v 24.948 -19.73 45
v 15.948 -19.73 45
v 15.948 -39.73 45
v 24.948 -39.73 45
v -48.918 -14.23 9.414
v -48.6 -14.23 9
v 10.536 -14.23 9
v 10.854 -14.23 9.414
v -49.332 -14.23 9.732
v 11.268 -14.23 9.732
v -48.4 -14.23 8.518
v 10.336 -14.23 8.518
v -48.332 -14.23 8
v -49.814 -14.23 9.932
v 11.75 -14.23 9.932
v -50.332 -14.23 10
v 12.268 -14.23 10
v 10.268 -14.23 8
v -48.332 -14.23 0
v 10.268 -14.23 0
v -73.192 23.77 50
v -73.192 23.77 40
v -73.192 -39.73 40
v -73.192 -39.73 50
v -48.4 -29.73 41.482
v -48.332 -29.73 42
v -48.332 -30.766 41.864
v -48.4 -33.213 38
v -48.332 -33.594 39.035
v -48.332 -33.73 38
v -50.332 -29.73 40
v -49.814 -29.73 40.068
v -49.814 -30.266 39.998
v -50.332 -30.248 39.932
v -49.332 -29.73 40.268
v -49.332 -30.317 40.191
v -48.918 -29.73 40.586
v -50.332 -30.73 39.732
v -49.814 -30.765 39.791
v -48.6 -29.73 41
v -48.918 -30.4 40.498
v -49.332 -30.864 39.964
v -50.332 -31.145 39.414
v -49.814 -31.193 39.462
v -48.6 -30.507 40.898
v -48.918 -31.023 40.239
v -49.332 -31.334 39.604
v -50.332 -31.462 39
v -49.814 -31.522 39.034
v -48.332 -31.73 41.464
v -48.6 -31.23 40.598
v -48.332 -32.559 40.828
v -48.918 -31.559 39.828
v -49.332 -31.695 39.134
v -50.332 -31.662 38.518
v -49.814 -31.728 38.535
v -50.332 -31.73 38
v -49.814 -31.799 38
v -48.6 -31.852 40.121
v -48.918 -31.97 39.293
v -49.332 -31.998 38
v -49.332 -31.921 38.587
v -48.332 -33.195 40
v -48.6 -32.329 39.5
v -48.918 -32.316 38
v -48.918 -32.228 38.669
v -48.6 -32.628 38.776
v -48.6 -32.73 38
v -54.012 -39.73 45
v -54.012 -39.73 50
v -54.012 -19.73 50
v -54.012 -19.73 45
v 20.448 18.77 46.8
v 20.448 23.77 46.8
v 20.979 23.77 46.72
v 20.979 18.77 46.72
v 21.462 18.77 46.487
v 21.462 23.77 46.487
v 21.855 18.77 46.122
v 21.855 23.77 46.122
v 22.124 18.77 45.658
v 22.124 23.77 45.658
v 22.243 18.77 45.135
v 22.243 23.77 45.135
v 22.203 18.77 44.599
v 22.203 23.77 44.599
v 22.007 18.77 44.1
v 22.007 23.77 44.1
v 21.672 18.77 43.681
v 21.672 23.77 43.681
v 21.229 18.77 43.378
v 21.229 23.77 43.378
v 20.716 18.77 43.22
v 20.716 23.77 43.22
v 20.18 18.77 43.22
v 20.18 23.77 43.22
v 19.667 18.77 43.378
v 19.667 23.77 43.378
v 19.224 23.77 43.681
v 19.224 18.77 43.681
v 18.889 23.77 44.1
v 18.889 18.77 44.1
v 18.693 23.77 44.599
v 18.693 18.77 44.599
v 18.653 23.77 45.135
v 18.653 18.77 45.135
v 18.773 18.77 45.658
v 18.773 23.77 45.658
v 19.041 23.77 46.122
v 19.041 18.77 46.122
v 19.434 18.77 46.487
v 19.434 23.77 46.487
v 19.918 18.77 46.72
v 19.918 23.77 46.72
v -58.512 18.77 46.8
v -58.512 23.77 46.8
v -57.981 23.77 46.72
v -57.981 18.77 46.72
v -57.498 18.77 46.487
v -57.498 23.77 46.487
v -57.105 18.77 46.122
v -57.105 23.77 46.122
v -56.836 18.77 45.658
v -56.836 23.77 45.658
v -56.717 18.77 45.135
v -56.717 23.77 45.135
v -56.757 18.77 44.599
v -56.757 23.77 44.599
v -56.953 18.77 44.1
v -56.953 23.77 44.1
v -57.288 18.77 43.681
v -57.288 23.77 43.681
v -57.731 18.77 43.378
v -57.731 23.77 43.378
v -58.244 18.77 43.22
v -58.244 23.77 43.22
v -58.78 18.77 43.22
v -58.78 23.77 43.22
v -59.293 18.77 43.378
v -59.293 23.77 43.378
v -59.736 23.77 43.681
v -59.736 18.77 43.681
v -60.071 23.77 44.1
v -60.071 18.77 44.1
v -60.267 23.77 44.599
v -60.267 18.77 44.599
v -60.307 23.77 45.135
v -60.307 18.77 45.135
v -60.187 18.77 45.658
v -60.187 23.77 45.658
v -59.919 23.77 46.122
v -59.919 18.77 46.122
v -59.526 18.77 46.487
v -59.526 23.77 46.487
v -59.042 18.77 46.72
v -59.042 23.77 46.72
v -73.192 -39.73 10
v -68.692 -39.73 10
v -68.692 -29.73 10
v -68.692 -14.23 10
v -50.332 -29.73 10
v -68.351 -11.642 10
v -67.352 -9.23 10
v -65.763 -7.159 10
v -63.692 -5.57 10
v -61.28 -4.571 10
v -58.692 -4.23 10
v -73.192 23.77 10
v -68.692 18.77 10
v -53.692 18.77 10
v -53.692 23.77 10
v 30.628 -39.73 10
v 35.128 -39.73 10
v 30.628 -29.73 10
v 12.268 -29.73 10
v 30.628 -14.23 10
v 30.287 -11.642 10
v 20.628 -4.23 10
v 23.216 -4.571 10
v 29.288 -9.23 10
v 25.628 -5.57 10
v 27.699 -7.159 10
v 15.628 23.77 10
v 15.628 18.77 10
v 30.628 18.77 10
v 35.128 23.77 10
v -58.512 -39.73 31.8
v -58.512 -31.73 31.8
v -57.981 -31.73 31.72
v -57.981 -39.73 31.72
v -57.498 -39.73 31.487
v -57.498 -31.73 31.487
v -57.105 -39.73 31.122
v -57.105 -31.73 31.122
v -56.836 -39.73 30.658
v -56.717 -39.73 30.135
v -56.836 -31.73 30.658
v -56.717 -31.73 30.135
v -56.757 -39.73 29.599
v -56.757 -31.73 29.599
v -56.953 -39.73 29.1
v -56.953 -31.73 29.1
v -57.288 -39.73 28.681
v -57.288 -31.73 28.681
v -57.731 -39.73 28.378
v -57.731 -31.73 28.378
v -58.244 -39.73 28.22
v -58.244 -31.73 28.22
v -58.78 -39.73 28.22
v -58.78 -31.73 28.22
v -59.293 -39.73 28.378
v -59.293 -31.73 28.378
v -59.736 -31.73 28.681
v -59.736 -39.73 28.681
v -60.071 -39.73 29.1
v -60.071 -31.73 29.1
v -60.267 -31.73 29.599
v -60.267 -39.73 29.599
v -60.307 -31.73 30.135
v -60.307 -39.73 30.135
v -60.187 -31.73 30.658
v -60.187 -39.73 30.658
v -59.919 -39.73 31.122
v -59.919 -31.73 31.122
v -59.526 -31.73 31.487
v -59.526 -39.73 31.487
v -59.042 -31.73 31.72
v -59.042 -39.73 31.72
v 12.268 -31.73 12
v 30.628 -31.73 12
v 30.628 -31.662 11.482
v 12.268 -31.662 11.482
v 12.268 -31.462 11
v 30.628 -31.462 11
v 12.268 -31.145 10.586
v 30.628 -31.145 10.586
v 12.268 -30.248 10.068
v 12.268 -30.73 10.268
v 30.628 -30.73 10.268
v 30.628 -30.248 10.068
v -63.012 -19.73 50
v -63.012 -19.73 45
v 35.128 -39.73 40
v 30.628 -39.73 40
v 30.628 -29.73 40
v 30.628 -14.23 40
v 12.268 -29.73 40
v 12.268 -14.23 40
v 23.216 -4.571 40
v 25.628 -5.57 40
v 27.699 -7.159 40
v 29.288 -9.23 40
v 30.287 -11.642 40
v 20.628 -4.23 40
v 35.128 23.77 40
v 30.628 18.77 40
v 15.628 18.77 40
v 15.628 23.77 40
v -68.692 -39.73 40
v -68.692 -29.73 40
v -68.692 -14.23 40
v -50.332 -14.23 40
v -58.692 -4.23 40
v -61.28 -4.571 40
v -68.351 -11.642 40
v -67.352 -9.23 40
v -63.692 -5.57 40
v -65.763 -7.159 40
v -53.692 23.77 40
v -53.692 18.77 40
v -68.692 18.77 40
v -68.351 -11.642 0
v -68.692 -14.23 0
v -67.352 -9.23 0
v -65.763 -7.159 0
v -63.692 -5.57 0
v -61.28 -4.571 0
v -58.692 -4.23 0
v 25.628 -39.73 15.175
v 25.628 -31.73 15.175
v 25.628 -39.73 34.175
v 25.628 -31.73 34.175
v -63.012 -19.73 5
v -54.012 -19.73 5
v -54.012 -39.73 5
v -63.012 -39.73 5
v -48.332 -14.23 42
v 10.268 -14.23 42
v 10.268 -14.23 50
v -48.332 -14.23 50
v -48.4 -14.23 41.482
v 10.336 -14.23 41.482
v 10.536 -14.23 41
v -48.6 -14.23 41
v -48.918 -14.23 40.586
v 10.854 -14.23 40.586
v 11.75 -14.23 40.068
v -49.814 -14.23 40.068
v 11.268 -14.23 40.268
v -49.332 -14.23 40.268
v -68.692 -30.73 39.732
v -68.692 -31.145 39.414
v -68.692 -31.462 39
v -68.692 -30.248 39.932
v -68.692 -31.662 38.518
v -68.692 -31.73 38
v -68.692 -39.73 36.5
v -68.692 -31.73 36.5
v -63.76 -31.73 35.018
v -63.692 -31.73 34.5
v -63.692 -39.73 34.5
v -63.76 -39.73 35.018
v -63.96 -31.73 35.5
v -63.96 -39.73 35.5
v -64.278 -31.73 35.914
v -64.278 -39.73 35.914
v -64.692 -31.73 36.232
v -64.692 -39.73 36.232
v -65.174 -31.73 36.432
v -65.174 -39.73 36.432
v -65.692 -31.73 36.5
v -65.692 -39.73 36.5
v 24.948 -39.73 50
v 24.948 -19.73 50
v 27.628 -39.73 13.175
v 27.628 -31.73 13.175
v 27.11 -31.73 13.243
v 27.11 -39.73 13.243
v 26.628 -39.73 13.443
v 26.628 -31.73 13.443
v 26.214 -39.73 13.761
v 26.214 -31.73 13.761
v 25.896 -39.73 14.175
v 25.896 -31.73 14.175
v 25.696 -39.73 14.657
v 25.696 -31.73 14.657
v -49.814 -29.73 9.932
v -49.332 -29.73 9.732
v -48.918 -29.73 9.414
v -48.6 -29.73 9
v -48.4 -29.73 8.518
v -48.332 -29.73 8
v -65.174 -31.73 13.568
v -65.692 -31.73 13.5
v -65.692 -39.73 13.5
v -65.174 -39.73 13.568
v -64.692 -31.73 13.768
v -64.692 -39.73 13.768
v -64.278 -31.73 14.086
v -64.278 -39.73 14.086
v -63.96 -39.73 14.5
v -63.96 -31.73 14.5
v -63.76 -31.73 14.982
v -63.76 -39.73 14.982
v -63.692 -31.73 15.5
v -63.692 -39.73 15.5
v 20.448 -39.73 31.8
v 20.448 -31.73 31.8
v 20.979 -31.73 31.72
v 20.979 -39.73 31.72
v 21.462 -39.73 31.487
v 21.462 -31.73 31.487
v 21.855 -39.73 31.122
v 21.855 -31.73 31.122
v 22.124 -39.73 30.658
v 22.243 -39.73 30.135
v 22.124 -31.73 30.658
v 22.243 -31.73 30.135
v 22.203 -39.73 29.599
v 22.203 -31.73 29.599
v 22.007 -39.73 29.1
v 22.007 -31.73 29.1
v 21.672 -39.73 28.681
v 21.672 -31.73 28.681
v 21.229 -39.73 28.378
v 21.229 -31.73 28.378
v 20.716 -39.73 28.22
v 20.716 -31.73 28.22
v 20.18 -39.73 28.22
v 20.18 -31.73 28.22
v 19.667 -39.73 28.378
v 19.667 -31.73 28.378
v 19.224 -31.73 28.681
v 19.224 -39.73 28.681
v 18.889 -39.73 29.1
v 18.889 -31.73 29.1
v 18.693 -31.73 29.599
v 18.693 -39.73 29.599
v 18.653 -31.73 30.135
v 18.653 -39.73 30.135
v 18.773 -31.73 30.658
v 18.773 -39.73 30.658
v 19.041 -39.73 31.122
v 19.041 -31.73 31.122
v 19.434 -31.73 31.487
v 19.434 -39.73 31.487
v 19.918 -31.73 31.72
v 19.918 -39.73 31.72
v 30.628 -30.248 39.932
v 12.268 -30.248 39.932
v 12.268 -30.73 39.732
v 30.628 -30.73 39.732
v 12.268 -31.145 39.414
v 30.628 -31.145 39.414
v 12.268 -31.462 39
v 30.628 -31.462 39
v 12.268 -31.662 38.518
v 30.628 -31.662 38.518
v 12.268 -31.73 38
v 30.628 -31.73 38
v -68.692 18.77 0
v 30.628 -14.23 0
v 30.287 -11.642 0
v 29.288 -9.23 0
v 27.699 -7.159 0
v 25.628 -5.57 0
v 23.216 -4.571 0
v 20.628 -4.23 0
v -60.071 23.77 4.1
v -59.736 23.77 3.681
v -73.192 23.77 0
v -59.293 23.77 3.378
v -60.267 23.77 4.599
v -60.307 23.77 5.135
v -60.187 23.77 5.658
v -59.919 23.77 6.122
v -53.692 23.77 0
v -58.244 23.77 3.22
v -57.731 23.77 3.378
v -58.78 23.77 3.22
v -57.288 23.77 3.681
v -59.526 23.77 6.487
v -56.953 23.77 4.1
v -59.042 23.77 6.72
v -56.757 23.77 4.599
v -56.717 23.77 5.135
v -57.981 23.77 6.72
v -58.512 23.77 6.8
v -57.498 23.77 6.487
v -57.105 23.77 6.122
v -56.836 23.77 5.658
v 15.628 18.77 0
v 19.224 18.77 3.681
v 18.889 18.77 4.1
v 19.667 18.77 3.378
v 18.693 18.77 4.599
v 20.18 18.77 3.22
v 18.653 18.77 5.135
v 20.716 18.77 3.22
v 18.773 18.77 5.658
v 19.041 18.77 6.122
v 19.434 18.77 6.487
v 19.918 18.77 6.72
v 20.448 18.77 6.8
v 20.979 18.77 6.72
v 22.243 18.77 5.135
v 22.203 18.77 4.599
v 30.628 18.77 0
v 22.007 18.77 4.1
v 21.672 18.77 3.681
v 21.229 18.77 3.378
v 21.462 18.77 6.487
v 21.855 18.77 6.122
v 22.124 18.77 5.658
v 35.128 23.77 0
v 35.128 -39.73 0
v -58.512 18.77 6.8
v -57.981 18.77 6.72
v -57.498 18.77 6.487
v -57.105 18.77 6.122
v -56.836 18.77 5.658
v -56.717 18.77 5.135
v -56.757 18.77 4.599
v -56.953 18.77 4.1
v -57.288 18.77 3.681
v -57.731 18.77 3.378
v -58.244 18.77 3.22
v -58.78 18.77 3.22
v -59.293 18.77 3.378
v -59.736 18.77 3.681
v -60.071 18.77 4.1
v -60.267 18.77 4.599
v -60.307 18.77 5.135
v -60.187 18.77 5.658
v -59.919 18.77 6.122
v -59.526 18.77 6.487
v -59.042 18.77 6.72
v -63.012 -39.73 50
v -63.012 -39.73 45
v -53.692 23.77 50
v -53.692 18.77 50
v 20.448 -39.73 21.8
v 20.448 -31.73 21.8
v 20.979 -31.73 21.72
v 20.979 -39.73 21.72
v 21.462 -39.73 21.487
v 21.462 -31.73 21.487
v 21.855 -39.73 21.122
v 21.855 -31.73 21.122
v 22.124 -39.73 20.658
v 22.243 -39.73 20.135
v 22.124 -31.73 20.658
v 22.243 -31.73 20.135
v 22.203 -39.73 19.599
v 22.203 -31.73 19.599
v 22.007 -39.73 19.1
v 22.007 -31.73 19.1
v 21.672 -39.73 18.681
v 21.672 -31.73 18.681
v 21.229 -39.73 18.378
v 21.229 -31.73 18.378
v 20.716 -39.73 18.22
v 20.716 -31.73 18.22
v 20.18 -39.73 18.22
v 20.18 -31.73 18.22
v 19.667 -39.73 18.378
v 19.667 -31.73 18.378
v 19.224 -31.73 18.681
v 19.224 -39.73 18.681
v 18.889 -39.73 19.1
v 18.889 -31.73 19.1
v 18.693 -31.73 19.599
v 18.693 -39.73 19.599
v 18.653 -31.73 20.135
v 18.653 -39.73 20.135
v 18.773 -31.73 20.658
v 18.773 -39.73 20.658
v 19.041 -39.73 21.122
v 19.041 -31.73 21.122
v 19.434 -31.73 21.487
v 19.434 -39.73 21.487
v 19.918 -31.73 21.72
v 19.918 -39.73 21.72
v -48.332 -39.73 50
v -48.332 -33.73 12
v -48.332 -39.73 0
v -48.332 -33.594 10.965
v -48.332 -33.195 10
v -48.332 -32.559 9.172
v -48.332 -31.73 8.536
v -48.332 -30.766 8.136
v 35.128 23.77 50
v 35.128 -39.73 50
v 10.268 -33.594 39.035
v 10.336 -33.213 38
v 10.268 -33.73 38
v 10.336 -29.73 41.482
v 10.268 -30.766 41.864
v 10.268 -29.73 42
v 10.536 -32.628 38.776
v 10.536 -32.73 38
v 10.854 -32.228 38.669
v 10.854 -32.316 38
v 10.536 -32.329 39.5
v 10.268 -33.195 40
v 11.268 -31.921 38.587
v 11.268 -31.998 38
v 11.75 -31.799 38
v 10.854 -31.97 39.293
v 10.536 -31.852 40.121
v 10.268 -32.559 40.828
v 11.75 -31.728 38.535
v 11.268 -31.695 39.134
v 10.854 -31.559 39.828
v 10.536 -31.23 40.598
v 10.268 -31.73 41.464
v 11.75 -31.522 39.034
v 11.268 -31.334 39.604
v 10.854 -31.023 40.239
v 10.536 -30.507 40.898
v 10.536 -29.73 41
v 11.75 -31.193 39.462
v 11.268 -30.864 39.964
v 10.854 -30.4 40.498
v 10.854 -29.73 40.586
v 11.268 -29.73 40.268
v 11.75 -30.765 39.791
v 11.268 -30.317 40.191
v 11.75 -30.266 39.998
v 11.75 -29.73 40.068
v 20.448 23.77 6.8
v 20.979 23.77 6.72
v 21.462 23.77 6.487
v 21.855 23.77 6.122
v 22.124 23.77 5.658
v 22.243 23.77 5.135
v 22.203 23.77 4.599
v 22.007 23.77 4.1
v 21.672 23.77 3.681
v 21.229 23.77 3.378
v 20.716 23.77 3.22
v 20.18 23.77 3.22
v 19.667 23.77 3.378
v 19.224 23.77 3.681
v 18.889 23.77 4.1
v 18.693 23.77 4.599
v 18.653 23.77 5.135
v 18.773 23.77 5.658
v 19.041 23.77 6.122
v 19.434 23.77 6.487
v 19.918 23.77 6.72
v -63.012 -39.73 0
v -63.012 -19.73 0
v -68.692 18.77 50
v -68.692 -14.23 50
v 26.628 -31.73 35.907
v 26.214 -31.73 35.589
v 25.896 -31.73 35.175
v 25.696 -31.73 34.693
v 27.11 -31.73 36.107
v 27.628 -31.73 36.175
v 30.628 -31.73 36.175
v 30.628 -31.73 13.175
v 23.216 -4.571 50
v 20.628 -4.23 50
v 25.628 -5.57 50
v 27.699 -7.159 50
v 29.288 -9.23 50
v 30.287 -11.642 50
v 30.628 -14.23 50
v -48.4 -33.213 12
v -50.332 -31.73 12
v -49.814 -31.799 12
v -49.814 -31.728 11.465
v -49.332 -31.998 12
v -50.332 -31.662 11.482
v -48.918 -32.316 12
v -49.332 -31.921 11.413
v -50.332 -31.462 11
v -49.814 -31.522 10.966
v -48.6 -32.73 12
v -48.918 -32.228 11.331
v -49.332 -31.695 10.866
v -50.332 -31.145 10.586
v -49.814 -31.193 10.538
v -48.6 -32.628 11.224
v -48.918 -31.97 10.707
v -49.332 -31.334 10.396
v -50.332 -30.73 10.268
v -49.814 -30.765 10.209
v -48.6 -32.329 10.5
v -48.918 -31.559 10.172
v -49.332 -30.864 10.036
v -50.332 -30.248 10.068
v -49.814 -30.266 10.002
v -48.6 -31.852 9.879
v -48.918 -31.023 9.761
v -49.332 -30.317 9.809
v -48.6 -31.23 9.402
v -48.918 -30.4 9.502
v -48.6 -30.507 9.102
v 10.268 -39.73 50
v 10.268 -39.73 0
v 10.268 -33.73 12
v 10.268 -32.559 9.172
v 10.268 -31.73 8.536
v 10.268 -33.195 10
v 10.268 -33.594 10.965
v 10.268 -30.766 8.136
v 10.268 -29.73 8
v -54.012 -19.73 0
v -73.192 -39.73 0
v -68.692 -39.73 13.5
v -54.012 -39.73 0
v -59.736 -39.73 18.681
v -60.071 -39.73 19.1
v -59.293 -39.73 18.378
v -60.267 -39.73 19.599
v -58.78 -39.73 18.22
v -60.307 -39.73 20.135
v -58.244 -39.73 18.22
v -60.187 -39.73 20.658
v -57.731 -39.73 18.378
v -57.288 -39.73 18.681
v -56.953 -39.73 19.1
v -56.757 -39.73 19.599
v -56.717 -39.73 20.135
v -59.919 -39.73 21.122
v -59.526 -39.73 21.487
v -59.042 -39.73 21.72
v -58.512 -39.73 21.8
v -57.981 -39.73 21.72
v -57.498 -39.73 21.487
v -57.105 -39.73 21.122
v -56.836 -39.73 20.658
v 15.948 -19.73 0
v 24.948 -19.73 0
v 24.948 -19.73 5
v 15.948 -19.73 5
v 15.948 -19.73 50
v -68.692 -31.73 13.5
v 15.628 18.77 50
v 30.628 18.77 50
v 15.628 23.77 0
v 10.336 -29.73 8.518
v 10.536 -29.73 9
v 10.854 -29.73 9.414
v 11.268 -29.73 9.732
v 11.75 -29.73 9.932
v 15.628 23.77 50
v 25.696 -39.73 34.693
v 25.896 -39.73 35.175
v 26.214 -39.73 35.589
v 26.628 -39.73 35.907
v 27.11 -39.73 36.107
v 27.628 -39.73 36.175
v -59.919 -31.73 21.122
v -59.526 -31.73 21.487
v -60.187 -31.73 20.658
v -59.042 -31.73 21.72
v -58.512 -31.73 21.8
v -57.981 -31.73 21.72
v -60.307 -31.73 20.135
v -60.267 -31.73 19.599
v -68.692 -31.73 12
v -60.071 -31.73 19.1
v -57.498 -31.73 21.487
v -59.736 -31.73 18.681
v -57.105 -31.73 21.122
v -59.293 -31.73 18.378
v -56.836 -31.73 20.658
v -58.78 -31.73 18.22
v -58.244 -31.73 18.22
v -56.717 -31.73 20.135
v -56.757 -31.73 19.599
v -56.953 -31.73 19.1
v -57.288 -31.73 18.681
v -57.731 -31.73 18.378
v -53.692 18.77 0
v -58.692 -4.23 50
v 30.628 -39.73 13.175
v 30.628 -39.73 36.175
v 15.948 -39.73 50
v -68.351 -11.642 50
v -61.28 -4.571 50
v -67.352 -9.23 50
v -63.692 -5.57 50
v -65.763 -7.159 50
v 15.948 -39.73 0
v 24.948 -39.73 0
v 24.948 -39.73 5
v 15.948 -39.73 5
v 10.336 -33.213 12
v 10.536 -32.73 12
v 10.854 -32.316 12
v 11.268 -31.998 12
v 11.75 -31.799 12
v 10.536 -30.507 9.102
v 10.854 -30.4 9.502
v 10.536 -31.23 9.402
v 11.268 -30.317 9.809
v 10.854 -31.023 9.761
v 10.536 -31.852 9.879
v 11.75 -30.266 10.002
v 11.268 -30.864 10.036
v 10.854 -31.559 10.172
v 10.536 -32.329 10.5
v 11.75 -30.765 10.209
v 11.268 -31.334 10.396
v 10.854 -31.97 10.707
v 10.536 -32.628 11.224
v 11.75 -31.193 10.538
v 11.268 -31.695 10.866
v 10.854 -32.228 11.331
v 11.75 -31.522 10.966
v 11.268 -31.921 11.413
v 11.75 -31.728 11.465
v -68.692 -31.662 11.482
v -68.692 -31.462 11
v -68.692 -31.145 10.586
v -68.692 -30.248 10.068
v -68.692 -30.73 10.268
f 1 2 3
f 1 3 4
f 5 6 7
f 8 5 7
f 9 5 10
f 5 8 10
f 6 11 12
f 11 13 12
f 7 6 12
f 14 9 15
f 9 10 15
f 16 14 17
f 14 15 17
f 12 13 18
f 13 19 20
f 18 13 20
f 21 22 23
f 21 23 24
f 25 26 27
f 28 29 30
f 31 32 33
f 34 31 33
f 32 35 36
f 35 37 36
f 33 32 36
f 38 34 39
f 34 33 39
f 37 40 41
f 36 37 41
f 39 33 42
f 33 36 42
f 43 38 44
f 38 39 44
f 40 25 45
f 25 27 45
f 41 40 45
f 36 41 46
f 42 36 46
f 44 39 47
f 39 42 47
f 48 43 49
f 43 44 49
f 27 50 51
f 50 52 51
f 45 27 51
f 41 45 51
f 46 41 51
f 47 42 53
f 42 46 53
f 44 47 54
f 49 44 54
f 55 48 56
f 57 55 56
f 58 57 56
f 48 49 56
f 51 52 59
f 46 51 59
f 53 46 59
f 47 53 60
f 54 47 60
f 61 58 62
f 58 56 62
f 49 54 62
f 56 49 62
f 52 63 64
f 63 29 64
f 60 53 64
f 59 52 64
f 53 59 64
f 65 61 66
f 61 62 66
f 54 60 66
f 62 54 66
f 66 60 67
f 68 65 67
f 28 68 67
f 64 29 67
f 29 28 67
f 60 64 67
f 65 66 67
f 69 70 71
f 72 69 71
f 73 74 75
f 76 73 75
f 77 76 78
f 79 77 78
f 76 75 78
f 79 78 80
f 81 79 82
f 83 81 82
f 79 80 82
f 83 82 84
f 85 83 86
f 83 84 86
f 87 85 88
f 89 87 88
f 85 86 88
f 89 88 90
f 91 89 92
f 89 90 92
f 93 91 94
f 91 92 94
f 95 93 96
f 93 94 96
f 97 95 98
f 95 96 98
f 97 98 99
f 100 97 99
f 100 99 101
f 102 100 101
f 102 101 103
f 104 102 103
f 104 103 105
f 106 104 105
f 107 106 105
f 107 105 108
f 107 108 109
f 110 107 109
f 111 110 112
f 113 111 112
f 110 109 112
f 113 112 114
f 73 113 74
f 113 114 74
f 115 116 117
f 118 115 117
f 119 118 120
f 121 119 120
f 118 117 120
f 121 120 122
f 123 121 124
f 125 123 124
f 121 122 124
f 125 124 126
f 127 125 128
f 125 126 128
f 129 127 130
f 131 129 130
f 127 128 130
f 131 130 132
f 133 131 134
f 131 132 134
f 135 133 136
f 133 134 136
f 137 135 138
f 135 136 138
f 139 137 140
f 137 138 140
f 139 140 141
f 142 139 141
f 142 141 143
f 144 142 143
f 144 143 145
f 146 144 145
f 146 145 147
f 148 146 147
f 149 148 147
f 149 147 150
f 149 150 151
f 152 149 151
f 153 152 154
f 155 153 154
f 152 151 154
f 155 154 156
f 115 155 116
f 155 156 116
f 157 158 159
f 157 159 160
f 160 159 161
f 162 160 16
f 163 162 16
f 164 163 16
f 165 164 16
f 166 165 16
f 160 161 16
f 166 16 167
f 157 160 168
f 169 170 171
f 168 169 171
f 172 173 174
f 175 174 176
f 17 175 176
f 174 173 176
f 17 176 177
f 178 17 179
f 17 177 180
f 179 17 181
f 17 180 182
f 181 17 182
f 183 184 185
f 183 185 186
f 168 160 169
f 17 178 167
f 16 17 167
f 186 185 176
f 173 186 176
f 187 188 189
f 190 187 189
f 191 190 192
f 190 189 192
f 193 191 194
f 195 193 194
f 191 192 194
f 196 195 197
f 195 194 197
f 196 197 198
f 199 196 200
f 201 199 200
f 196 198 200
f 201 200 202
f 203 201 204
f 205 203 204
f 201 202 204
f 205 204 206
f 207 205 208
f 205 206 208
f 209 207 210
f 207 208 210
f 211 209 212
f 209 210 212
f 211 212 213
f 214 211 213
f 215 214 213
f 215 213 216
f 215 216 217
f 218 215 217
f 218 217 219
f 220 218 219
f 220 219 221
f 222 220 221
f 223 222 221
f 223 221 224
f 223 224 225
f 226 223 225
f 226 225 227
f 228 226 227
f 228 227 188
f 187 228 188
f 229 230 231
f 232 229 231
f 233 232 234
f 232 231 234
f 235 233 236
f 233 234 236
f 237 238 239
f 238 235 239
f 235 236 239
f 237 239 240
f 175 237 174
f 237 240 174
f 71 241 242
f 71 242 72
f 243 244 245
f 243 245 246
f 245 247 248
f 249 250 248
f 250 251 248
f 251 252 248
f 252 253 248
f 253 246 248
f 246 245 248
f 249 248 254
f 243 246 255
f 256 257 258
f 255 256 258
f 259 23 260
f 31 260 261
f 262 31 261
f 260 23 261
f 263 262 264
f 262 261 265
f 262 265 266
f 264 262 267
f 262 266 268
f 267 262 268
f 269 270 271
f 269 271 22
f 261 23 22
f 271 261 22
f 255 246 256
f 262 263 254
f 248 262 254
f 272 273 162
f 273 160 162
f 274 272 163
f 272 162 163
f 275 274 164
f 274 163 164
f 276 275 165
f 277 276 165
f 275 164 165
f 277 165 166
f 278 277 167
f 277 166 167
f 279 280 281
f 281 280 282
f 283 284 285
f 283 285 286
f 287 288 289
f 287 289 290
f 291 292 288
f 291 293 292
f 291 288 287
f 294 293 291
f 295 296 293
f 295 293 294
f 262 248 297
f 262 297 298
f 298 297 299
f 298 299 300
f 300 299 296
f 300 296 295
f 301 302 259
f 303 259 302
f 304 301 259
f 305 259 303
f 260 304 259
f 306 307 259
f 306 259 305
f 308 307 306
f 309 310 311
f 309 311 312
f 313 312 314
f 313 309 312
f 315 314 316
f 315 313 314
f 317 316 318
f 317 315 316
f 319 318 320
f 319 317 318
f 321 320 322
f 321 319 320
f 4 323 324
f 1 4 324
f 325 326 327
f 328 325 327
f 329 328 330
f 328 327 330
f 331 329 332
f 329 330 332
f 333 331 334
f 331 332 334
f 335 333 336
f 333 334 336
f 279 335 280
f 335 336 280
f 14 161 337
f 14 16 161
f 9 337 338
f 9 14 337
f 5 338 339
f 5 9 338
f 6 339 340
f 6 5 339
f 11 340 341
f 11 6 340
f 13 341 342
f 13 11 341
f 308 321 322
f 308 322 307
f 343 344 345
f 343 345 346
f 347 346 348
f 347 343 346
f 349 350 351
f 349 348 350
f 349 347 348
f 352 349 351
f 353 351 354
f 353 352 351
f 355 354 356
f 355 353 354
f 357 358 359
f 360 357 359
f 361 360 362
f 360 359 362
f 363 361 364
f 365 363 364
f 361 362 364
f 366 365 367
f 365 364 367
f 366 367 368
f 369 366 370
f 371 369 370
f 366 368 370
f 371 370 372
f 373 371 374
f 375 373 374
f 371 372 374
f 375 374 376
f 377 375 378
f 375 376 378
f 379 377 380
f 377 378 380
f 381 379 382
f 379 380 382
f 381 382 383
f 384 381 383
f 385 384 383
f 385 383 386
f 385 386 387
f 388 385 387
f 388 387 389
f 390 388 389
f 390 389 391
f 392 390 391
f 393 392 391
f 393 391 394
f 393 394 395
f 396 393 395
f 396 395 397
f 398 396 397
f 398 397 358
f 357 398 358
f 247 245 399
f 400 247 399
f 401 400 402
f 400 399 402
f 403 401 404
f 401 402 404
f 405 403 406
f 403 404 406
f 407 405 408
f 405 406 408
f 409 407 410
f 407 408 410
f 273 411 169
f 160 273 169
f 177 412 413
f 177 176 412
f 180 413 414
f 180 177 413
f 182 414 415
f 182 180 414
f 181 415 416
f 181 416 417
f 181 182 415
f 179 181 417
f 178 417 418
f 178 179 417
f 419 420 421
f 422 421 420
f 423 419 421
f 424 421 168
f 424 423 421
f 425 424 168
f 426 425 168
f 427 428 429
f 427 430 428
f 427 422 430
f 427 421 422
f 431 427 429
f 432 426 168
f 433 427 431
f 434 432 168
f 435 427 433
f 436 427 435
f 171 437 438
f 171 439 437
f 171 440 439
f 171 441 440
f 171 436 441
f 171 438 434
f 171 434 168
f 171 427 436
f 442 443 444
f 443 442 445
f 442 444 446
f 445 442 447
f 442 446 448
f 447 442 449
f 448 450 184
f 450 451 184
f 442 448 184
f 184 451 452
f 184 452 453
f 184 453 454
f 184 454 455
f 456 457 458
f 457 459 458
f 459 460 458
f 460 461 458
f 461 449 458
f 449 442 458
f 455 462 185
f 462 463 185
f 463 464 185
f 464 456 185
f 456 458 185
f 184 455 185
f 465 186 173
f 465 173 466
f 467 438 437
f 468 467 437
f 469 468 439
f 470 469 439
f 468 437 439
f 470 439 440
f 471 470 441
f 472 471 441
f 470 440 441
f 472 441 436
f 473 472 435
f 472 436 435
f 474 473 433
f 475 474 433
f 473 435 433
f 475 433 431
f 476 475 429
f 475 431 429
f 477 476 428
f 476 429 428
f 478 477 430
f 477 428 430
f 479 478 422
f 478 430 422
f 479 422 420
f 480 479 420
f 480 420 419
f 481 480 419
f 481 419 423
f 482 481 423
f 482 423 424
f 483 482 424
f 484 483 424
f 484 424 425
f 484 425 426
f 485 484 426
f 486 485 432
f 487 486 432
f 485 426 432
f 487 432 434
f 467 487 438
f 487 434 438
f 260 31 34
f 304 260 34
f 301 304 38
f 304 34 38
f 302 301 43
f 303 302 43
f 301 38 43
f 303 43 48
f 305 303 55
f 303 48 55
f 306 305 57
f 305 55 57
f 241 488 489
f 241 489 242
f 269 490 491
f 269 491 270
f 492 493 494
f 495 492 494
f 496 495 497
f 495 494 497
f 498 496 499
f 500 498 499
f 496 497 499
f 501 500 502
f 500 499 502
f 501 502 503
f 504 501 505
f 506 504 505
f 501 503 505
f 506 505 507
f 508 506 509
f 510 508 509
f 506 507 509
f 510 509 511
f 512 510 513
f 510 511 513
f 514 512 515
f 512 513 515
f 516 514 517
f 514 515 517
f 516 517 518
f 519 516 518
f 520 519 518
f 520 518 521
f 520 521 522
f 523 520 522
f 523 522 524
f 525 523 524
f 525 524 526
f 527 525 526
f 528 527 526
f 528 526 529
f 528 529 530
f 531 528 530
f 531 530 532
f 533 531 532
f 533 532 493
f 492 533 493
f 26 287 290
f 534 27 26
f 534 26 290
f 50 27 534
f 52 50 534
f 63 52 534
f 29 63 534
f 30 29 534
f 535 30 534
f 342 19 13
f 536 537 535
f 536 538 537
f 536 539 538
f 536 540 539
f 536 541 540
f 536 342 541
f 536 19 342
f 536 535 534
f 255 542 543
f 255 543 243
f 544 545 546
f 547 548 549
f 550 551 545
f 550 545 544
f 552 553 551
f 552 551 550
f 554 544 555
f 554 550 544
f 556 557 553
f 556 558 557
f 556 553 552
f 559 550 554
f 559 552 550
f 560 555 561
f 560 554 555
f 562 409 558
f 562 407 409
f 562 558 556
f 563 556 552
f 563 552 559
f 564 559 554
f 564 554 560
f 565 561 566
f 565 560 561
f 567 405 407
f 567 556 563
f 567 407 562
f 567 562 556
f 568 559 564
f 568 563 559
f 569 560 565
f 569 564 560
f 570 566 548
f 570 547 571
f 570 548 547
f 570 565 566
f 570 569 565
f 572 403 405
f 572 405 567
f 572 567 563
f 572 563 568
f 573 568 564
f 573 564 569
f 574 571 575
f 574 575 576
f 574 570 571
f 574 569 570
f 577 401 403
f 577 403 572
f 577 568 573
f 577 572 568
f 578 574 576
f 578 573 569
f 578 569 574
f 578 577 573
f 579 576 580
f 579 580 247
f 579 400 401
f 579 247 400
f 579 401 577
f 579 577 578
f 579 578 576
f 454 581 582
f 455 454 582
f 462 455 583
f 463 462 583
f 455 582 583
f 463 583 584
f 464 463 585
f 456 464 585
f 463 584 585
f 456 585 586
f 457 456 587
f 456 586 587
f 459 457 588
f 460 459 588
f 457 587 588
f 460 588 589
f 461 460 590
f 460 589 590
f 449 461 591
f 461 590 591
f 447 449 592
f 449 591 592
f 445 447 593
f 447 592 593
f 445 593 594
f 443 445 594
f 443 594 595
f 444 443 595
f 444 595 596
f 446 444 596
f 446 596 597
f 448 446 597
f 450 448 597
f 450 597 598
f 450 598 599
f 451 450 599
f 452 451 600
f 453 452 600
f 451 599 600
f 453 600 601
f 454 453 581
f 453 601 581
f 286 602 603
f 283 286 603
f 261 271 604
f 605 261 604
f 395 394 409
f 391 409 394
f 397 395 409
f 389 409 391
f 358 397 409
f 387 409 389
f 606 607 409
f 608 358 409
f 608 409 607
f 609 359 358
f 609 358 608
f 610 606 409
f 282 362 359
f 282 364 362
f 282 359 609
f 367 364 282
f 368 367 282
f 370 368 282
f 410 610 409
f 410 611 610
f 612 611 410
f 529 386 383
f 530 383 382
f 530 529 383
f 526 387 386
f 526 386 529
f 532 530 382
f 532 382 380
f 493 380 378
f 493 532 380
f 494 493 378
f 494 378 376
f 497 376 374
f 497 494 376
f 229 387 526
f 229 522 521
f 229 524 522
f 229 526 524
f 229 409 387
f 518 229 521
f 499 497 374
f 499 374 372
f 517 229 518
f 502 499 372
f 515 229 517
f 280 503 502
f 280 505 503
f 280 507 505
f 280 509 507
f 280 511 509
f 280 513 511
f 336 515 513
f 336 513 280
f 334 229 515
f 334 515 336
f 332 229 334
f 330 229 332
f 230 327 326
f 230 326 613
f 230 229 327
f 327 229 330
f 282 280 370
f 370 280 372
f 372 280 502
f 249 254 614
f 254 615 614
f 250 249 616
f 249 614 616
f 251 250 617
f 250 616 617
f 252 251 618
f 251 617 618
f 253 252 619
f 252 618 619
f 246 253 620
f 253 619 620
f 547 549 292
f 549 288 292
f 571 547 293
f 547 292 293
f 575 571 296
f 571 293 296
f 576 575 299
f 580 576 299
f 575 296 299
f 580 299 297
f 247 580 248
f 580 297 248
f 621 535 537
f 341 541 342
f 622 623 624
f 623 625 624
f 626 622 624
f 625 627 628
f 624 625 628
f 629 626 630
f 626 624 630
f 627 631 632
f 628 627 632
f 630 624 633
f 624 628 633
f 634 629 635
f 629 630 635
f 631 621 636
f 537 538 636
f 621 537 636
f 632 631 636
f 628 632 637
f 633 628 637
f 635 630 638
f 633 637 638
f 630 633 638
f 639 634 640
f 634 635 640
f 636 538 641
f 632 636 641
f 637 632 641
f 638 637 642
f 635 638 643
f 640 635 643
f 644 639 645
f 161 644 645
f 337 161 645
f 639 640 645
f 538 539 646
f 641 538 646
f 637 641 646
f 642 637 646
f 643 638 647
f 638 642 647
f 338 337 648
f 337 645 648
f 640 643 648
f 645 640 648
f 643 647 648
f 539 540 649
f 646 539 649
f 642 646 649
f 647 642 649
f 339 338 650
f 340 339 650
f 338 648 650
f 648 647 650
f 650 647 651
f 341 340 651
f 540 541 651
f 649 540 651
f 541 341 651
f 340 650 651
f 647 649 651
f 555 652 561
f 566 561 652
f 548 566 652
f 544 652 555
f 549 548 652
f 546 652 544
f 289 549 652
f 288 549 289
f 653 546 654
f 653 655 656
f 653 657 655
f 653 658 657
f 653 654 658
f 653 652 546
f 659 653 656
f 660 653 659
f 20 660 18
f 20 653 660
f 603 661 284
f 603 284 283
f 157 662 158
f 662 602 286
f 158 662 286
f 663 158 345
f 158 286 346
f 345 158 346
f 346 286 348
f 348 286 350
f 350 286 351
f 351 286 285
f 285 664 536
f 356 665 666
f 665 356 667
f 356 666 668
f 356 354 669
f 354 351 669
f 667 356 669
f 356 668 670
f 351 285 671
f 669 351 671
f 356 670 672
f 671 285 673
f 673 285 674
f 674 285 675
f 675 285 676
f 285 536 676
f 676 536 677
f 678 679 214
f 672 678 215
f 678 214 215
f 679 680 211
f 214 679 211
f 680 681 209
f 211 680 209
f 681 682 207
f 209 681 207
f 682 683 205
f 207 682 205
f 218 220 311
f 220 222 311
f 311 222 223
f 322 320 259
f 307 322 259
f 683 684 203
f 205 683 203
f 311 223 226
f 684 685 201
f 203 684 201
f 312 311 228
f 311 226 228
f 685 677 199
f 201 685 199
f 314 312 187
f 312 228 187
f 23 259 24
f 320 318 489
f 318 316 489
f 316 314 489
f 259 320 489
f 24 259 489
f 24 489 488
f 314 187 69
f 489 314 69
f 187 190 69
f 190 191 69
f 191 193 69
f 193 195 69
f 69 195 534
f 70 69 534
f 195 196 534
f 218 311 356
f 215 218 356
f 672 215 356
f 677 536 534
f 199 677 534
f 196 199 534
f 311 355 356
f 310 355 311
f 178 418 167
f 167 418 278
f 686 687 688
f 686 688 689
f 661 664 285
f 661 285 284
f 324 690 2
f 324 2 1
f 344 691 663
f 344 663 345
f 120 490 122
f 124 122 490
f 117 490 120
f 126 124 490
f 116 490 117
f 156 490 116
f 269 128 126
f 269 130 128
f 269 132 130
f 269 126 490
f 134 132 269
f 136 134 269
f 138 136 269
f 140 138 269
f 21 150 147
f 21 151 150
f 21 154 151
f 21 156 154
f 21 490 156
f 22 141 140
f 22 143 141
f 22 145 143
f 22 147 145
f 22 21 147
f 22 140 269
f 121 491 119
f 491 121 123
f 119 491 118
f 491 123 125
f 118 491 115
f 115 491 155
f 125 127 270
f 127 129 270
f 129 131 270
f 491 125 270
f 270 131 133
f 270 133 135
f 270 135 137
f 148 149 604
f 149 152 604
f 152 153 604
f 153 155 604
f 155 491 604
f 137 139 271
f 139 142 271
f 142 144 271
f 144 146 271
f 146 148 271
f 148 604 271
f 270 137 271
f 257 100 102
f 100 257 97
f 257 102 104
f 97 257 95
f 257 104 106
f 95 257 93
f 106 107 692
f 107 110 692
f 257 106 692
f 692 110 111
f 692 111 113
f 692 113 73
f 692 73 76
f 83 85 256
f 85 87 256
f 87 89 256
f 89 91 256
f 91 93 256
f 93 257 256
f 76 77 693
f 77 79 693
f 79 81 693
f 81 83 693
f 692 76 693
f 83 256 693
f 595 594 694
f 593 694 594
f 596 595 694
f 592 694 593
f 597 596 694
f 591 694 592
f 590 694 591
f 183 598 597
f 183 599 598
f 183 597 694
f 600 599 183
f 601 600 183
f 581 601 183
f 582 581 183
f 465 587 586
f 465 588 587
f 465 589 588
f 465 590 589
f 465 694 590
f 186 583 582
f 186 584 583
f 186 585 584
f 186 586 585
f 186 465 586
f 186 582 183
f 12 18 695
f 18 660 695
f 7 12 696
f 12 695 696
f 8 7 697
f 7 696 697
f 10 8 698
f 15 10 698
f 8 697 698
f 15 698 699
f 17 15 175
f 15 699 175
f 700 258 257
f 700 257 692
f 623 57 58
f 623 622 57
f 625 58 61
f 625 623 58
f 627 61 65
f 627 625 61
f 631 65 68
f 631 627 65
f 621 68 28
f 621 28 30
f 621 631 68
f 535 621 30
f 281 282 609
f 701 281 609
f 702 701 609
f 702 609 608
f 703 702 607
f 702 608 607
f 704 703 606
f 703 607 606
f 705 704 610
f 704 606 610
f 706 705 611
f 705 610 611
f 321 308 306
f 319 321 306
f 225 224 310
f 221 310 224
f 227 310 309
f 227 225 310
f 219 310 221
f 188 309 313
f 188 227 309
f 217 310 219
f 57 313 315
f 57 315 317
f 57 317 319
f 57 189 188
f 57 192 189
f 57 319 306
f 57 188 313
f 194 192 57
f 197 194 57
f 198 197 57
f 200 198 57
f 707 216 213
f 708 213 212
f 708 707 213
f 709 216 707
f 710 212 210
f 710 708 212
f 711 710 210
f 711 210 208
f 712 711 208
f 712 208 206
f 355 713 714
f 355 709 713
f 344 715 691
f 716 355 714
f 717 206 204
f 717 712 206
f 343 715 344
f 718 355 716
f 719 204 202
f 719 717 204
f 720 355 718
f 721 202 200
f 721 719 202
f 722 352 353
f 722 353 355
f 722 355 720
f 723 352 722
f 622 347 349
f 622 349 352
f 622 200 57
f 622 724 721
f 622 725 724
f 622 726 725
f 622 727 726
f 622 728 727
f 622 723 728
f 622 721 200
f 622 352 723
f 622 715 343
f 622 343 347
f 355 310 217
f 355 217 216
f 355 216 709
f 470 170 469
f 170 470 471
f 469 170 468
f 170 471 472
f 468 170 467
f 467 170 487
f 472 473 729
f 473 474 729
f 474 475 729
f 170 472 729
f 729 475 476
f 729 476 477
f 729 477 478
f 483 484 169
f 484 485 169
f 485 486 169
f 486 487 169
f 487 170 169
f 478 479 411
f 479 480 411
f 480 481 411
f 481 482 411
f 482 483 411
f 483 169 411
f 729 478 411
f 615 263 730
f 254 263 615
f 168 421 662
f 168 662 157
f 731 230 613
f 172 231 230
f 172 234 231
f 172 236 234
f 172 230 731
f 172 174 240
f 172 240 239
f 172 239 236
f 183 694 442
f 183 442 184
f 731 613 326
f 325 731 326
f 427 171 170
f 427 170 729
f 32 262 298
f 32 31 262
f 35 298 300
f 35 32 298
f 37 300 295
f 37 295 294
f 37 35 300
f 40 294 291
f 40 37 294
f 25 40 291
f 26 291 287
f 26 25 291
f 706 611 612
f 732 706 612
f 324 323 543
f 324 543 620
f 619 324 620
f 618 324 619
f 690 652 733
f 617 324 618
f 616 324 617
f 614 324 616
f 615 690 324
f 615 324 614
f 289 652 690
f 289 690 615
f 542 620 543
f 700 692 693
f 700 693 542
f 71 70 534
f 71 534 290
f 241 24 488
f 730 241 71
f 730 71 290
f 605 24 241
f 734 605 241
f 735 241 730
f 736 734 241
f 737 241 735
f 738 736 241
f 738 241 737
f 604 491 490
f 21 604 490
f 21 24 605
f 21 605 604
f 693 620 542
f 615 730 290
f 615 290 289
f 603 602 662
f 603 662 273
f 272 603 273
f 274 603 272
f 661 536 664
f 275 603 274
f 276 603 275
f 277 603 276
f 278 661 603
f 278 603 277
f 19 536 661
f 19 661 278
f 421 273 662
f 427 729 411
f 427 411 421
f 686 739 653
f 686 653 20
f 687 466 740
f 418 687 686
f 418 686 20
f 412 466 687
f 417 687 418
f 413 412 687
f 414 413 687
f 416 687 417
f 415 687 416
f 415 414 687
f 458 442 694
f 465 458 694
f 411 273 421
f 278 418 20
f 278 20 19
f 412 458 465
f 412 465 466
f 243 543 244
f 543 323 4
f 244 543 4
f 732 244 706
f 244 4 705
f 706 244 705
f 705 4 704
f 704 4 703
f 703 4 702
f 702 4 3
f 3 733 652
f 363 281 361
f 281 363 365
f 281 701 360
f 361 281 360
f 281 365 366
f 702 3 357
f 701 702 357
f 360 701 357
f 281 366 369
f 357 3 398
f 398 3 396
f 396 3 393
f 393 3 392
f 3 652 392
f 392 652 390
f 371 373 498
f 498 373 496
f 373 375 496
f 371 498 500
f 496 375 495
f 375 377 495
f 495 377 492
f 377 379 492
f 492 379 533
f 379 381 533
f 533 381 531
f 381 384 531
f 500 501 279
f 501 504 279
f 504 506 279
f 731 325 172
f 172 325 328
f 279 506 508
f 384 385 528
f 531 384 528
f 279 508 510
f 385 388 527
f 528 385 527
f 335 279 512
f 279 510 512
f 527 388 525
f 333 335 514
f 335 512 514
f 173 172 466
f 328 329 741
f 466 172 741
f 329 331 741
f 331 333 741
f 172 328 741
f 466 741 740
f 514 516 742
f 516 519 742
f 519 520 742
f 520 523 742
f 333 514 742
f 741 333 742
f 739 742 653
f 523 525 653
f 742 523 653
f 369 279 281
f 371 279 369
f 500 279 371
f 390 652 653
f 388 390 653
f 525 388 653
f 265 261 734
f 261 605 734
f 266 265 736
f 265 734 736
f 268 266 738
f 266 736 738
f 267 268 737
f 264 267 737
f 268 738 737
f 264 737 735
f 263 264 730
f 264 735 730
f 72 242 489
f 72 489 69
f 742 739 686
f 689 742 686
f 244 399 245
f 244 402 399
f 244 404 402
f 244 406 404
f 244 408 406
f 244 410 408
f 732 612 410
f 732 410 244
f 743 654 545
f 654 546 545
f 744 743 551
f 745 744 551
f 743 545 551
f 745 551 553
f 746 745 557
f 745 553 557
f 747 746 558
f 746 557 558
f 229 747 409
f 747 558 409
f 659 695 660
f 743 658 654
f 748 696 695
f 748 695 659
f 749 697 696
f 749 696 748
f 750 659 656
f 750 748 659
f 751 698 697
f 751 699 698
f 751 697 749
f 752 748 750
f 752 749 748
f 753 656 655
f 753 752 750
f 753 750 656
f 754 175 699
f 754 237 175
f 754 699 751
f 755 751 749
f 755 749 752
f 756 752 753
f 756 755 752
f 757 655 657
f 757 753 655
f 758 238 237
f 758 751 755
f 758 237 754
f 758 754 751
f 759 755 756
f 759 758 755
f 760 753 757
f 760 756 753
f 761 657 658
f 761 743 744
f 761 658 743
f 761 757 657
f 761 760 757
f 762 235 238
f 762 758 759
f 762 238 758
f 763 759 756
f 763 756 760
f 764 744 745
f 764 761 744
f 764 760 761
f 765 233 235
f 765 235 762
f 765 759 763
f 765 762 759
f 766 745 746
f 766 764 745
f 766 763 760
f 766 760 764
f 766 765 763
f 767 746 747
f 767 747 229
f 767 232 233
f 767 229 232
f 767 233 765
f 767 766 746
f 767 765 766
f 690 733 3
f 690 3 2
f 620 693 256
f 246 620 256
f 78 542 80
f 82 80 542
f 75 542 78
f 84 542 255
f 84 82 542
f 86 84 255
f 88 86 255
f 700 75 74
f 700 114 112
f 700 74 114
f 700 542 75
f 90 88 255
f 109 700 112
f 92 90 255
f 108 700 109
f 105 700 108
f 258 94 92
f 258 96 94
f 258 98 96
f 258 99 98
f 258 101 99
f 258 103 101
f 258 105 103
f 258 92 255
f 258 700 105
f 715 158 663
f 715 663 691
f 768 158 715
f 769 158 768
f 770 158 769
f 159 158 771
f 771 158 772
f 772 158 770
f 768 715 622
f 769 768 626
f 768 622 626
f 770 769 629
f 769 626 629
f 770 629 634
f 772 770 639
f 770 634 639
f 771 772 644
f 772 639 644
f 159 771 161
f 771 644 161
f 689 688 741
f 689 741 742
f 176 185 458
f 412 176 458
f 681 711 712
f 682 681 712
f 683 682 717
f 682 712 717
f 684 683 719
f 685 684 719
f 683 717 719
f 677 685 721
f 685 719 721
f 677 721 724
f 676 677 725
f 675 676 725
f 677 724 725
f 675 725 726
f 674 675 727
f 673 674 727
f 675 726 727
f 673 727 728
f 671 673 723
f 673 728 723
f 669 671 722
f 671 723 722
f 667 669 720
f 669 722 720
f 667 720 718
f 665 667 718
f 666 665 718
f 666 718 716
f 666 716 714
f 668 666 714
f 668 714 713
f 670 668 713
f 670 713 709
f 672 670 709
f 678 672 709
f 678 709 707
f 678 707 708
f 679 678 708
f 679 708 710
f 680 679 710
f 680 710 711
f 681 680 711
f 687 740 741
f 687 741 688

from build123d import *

# Parameters (mm, degrees)
BOSS_EXTRUDE1_DEPTH = 10
SKETCH2_W           = 20.36
SKETCH2_H           = 8
BOSS_EXTRUDE2_DEPTH = 30
BOSS_EXTRUDE3_DEPTH = 10
SKETCH4_R           = 1.8
CUT_EXTRUDE1_DEPTH  = 90.301874976
CUT_EXTRUDE2_DEPTH  = 90.301874976
FILLET2_R           = 10
FILLET3_R           = 2
FILLET4_R           = 2
SKETCH6_W           = 9
SKETCH6_H           = 20
CUT_EXTRUDE3_DEPTH  = 5
SKETCH7_W           = 9
SKETCH7_H           = 20
CUT_EXTRUDE4_DEPTH  = 5
SKETCH8_W           = 10
SKETCH8_H           = 63.5
BOSS_EXTRUDE4_DEPTH = 4.5
SKETCH9_W           = 10
SKETCH9_H           = 5
BOSS_EXTRUDE5_DEPTH = 15
SKETCH10_W          = 10
SKETCH10_H          = 63.5
BOSS_EXTRUDE6_DEPTH = 4.5
SKETCH11_W          = 10
SKETCH11_H          = 5
BOSS_EXTRUDE7_DEPTH = 15
SKETCH12_R          = 1.8
CUT_EXTRUDE5_DEPTH  = 5


with BuildPart() as part:
    # Sketch1 → Boss-Extrude1 (new body)
    with BuildSketch(Plane.XY):
        Polygon((-68.691883613, -39.730446699), (-48.331883613, -39.730446699), (-48.331883613, -14.230446699), (10.268116387, -14.230446699), (10.268116387, -39.730446699), (30.628116387, -39.730446699), (30.628116387, -4.230446699), (-68.691883613, -4.230446699), align=None)
    extrude(amount=BOSS_EXTRUDE1_DEPTH)

    # Sketch2 → Boss-Extrude2 (add)
    with BuildSketch(Plane.XY.offset(10)):
        with Locations((-58.511883613, -35.730446699)):
            Rectangle(SKETCH2_W, SKETCH2_H)
        with Locations((20.448116387, -35.730446699)):
            Rectangle(SKETCH2_W, SKETCH2_H)
    extrude(amount=BOSS_EXTRUDE2_DEPTH)

    # Sketch3 → Boss-Extrude3 (add)
    with BuildSketch(Plane.XY.offset(40)):
        Polygon((-68.691883613, -39.730446699), (-68.691883613, -4.230446699), (30.628116387, -4.230446699), (30.628116387, -39.730446699), (10.268116387, -39.730446699), (10.268116387, -14.230446699), (-48.331883613, -14.230446699), (-48.331883613, -39.730446699), align=None)
    extrude(amount=BOSS_EXTRUDE3_DEPTH)

    # Sketch4 → Cut-Extrude1 (cut, through all)
    with BuildSketch(Plane(origin=(0, -31.730446699, 0), x_dir=(1, 0, 0), z_dir=(0, 1, 0))):
        with Locations(Location((-58.511883613, -20, 0), (0, 0, 270))):
            Circle(SKETCH4_R)
        with Locations(Location((-58.511883613, -30, 0), (0, 0, 270))):
            Circle(SKETCH4_R)
        with Locations(Location((20.448116387, -30, 0), (0, 0, 270))):
            Circle(SKETCH4_R)
        with Locations(Location((20.448116387, -20, 0), (0, 0, 270))):
            Circle(SKETCH4_R)
    extrude(amount=-CUT_EXTRUDE1_DEPTH, mode=Mode.SUBTRACT)

    # Sketch5 → Cut-Extrude2 (cut, through all)
    with BuildSketch(Plane(origin=(0, -31.730446699, 0), x_dir=(1, 0, 0), z_dir=(0, 1, 0))):
        with BuildLine():
            Line((-68.691883613, -13.5), (-65.691883613, -13.5))
            ThreePointArc((-65.691883613, -13.5), (-64.277670051, -14.085786438), (-63.691883613, -15.5))
            Line((-63.691883613, -15.5), (-63.691883613, -34.5))
            ThreePointArc((-63.691883613, -34.5), (-64.277670051, -35.914213562), (-65.691883613, -36.5))
            Line((-65.691883613, -36.5), (-68.691883613, -36.5))
            Line((-68.691883613, -36.5), (-68.691883613, -13.5))
        make_face()
        with BuildLine():
            Line((30.628116387, -13.174954518), (27.628116387, -13.174954518))
            ThreePointArc((27.628116387, -13.174954518), (26.213902825, -13.760740955), (25.628116387, -15.174954518))
            Line((25.628116387, -15.174954518), (25.628116387, -34.174954518))
            ThreePointArc((25.628116387, -34.174954518), (26.213902825, -35.58916808), (27.628116387, -36.174954518))
            Line((27.628116387, -36.174954518), (30.628116387, -36.174954518))
            Line((30.628116387, -36.174954518), (30.628116387, -13.174954518))
        make_face()
    extrude(amount=-CUT_EXTRUDE2_DEPTH, mode=Mode.SUBTRACT)

    # Fillet2
    fillet2_edges = [part.edges().sort_by_distance(p)[0] for p in [
        (30.628116387, -4.230446699, 5),
        (30.628116387, -4.230446699, 45),
        (-68.691883613, -4.230446699, 5),
        (-68.691883613, -4.230446699, 45),
    ]]
    fillet(fillet2_edges, radius=FILLET2_R)

    # Fillet3
    fillet3_edges = [part.edges().sort_by_distance(p)[0] for p in [
        (20.448116387, -31.730446699, 40),
        (-58.511883613, -31.730446699, 40),
        (20.448116387, -31.730446699, 10),
        (-58.511883613, -31.730446699, 10),
    ]]
    fillet(fillet3_edges, radius=FILLET3_R)

    # Fillet4
    fillet4_edges = [part.edges().sort_by_distance(p)[0] for p in [
        (10.268116387, -21.980446699, 10),
        (-48.331883613, -21.980446699, 40),
        (10.268116387, -31.730446699, 25),
        (-48.331883613, -31.730446699, 25),
        (-48.331883613, -21.980446699, 10),
        (10.268116387, -31.144660261, 39.414213562),
        (-48.331883613, -31.144660261, 39.414213562),
        (10.268116387, -31.144660261, 10.585786438),
        (-48.331883613, -31.144660261, 10.585786438),
        (10.268116387, -21.980446699, 40),
    ]]
    fillet(fillet4_edges, radius=FILLET4_R)

    # Sketch6 → Cut-Extrude3 (cut)
    with BuildSketch(Plane.XY.offset(50)):
        with Locations((-58.511883613, -29.730446699)):
            Rectangle(SKETCH6_W, SKETCH6_H)
        with Locations((20.448116387, -29.730446699)):
            Rectangle(SKETCH6_W, SKETCH6_H)
    extrude(amount=-CUT_EXTRUDE3_DEPTH, mode=Mode.SUBTRACT)

    # Sketch7 → Cut-Extrude4 (cut)
    with BuildSketch(Plane(origin=(0, 0, 0), x_dir=(-1, 0, 0), z_dir=(0, 0, -1))):
        with Locations((-20.448116387, -29.730446699)):
            Rectangle(SKETCH7_W, SKETCH7_H)
        with Locations((58.511883613, -29.730446699)):
            Rectangle(SKETCH7_W, SKETCH7_H)
    extrude(amount=-CUT_EXTRUDE4_DEPTH, mode=Mode.SUBTRACT)

    # Sketch8 → Boss-Extrude4 (add)
    with BuildSketch(Plane(origin=(30.628116387, 0, 0), x_dir=(0, 0, -1), z_dir=(1, 0, 0))):
        with Locations((-45, -7.980446699)):
            Rectangle(SKETCH8_W, SKETCH8_H)
        with Locations((-5, -7.980446699)):
            Rectangle(SKETCH8_W, SKETCH8_H)
    extrude(amount=BOSS_EXTRUDE4_DEPTH)

    # Sketch9 → Boss-Extrude5 (add)
    with BuildSketch(Plane.ZY.offset(-30.628116387)):
        with Locations((5, 21.269553301)):
            Rectangle(SKETCH9_W, SKETCH9_H)
        with Locations((45, 21.269553301)):
            Rectangle(SKETCH9_W, SKETCH9_H)
    extrude(amount=BOSS_EXTRUDE5_DEPTH)

    # Sketch10 → Boss-Extrude6 (add)
    with BuildSketch(Plane.ZY.offset(68.691883613)):
        with Locations((5, -7.980446699)):
            Rectangle(SKETCH10_W, SKETCH10_H)
        with Locations((45, -7.980446699)):
            Rectangle(SKETCH10_W, SKETCH10_H)
    extrude(amount=BOSS_EXTRUDE6_DEPTH)

    # Sketch11 → Boss-Extrude7 (add)
    with BuildSketch(Plane(origin=(-68.691883613, 0, 0), x_dir=(0, 0, -1), z_dir=(1, 0, 0))):
        with Locations((-45, 21.269553301)):
            Rectangle(SKETCH11_W, SKETCH11_H)
        with Locations((-5, 21.269553301)):
            Rectangle(SKETCH11_W, SKETCH11_H)
    extrude(amount=BOSS_EXTRUDE7_DEPTH)

    # Sketch12 → Cut-Extrude5 (cut)
    with BuildSketch(Plane(origin=(0, 23.769553301, 0), x_dir=(1, 0, 0), z_dir=(0, 1, 0))):
        with Locations(Location((20.448116387, -45, 0), (0, 0, 270))):
            Circle(SKETCH12_R)
        with Locations(Location((20.448116387, -5, 0), (0, 0, 270))):
            Circle(SKETCH12_R)
        with Locations(Location((-58.511883613, -45, 0), (0, 0, 270))):
            Circle(SKETCH12_R)
        with Locations(Location((-58.511883613, -5, 0), (0, 0, 270))):
            Circle(SKETCH12_R)
    extrude(amount=-CUT_EXTRUDE5_DEPTH, mode=Mode.SUBTRACT)


solid = part.part
